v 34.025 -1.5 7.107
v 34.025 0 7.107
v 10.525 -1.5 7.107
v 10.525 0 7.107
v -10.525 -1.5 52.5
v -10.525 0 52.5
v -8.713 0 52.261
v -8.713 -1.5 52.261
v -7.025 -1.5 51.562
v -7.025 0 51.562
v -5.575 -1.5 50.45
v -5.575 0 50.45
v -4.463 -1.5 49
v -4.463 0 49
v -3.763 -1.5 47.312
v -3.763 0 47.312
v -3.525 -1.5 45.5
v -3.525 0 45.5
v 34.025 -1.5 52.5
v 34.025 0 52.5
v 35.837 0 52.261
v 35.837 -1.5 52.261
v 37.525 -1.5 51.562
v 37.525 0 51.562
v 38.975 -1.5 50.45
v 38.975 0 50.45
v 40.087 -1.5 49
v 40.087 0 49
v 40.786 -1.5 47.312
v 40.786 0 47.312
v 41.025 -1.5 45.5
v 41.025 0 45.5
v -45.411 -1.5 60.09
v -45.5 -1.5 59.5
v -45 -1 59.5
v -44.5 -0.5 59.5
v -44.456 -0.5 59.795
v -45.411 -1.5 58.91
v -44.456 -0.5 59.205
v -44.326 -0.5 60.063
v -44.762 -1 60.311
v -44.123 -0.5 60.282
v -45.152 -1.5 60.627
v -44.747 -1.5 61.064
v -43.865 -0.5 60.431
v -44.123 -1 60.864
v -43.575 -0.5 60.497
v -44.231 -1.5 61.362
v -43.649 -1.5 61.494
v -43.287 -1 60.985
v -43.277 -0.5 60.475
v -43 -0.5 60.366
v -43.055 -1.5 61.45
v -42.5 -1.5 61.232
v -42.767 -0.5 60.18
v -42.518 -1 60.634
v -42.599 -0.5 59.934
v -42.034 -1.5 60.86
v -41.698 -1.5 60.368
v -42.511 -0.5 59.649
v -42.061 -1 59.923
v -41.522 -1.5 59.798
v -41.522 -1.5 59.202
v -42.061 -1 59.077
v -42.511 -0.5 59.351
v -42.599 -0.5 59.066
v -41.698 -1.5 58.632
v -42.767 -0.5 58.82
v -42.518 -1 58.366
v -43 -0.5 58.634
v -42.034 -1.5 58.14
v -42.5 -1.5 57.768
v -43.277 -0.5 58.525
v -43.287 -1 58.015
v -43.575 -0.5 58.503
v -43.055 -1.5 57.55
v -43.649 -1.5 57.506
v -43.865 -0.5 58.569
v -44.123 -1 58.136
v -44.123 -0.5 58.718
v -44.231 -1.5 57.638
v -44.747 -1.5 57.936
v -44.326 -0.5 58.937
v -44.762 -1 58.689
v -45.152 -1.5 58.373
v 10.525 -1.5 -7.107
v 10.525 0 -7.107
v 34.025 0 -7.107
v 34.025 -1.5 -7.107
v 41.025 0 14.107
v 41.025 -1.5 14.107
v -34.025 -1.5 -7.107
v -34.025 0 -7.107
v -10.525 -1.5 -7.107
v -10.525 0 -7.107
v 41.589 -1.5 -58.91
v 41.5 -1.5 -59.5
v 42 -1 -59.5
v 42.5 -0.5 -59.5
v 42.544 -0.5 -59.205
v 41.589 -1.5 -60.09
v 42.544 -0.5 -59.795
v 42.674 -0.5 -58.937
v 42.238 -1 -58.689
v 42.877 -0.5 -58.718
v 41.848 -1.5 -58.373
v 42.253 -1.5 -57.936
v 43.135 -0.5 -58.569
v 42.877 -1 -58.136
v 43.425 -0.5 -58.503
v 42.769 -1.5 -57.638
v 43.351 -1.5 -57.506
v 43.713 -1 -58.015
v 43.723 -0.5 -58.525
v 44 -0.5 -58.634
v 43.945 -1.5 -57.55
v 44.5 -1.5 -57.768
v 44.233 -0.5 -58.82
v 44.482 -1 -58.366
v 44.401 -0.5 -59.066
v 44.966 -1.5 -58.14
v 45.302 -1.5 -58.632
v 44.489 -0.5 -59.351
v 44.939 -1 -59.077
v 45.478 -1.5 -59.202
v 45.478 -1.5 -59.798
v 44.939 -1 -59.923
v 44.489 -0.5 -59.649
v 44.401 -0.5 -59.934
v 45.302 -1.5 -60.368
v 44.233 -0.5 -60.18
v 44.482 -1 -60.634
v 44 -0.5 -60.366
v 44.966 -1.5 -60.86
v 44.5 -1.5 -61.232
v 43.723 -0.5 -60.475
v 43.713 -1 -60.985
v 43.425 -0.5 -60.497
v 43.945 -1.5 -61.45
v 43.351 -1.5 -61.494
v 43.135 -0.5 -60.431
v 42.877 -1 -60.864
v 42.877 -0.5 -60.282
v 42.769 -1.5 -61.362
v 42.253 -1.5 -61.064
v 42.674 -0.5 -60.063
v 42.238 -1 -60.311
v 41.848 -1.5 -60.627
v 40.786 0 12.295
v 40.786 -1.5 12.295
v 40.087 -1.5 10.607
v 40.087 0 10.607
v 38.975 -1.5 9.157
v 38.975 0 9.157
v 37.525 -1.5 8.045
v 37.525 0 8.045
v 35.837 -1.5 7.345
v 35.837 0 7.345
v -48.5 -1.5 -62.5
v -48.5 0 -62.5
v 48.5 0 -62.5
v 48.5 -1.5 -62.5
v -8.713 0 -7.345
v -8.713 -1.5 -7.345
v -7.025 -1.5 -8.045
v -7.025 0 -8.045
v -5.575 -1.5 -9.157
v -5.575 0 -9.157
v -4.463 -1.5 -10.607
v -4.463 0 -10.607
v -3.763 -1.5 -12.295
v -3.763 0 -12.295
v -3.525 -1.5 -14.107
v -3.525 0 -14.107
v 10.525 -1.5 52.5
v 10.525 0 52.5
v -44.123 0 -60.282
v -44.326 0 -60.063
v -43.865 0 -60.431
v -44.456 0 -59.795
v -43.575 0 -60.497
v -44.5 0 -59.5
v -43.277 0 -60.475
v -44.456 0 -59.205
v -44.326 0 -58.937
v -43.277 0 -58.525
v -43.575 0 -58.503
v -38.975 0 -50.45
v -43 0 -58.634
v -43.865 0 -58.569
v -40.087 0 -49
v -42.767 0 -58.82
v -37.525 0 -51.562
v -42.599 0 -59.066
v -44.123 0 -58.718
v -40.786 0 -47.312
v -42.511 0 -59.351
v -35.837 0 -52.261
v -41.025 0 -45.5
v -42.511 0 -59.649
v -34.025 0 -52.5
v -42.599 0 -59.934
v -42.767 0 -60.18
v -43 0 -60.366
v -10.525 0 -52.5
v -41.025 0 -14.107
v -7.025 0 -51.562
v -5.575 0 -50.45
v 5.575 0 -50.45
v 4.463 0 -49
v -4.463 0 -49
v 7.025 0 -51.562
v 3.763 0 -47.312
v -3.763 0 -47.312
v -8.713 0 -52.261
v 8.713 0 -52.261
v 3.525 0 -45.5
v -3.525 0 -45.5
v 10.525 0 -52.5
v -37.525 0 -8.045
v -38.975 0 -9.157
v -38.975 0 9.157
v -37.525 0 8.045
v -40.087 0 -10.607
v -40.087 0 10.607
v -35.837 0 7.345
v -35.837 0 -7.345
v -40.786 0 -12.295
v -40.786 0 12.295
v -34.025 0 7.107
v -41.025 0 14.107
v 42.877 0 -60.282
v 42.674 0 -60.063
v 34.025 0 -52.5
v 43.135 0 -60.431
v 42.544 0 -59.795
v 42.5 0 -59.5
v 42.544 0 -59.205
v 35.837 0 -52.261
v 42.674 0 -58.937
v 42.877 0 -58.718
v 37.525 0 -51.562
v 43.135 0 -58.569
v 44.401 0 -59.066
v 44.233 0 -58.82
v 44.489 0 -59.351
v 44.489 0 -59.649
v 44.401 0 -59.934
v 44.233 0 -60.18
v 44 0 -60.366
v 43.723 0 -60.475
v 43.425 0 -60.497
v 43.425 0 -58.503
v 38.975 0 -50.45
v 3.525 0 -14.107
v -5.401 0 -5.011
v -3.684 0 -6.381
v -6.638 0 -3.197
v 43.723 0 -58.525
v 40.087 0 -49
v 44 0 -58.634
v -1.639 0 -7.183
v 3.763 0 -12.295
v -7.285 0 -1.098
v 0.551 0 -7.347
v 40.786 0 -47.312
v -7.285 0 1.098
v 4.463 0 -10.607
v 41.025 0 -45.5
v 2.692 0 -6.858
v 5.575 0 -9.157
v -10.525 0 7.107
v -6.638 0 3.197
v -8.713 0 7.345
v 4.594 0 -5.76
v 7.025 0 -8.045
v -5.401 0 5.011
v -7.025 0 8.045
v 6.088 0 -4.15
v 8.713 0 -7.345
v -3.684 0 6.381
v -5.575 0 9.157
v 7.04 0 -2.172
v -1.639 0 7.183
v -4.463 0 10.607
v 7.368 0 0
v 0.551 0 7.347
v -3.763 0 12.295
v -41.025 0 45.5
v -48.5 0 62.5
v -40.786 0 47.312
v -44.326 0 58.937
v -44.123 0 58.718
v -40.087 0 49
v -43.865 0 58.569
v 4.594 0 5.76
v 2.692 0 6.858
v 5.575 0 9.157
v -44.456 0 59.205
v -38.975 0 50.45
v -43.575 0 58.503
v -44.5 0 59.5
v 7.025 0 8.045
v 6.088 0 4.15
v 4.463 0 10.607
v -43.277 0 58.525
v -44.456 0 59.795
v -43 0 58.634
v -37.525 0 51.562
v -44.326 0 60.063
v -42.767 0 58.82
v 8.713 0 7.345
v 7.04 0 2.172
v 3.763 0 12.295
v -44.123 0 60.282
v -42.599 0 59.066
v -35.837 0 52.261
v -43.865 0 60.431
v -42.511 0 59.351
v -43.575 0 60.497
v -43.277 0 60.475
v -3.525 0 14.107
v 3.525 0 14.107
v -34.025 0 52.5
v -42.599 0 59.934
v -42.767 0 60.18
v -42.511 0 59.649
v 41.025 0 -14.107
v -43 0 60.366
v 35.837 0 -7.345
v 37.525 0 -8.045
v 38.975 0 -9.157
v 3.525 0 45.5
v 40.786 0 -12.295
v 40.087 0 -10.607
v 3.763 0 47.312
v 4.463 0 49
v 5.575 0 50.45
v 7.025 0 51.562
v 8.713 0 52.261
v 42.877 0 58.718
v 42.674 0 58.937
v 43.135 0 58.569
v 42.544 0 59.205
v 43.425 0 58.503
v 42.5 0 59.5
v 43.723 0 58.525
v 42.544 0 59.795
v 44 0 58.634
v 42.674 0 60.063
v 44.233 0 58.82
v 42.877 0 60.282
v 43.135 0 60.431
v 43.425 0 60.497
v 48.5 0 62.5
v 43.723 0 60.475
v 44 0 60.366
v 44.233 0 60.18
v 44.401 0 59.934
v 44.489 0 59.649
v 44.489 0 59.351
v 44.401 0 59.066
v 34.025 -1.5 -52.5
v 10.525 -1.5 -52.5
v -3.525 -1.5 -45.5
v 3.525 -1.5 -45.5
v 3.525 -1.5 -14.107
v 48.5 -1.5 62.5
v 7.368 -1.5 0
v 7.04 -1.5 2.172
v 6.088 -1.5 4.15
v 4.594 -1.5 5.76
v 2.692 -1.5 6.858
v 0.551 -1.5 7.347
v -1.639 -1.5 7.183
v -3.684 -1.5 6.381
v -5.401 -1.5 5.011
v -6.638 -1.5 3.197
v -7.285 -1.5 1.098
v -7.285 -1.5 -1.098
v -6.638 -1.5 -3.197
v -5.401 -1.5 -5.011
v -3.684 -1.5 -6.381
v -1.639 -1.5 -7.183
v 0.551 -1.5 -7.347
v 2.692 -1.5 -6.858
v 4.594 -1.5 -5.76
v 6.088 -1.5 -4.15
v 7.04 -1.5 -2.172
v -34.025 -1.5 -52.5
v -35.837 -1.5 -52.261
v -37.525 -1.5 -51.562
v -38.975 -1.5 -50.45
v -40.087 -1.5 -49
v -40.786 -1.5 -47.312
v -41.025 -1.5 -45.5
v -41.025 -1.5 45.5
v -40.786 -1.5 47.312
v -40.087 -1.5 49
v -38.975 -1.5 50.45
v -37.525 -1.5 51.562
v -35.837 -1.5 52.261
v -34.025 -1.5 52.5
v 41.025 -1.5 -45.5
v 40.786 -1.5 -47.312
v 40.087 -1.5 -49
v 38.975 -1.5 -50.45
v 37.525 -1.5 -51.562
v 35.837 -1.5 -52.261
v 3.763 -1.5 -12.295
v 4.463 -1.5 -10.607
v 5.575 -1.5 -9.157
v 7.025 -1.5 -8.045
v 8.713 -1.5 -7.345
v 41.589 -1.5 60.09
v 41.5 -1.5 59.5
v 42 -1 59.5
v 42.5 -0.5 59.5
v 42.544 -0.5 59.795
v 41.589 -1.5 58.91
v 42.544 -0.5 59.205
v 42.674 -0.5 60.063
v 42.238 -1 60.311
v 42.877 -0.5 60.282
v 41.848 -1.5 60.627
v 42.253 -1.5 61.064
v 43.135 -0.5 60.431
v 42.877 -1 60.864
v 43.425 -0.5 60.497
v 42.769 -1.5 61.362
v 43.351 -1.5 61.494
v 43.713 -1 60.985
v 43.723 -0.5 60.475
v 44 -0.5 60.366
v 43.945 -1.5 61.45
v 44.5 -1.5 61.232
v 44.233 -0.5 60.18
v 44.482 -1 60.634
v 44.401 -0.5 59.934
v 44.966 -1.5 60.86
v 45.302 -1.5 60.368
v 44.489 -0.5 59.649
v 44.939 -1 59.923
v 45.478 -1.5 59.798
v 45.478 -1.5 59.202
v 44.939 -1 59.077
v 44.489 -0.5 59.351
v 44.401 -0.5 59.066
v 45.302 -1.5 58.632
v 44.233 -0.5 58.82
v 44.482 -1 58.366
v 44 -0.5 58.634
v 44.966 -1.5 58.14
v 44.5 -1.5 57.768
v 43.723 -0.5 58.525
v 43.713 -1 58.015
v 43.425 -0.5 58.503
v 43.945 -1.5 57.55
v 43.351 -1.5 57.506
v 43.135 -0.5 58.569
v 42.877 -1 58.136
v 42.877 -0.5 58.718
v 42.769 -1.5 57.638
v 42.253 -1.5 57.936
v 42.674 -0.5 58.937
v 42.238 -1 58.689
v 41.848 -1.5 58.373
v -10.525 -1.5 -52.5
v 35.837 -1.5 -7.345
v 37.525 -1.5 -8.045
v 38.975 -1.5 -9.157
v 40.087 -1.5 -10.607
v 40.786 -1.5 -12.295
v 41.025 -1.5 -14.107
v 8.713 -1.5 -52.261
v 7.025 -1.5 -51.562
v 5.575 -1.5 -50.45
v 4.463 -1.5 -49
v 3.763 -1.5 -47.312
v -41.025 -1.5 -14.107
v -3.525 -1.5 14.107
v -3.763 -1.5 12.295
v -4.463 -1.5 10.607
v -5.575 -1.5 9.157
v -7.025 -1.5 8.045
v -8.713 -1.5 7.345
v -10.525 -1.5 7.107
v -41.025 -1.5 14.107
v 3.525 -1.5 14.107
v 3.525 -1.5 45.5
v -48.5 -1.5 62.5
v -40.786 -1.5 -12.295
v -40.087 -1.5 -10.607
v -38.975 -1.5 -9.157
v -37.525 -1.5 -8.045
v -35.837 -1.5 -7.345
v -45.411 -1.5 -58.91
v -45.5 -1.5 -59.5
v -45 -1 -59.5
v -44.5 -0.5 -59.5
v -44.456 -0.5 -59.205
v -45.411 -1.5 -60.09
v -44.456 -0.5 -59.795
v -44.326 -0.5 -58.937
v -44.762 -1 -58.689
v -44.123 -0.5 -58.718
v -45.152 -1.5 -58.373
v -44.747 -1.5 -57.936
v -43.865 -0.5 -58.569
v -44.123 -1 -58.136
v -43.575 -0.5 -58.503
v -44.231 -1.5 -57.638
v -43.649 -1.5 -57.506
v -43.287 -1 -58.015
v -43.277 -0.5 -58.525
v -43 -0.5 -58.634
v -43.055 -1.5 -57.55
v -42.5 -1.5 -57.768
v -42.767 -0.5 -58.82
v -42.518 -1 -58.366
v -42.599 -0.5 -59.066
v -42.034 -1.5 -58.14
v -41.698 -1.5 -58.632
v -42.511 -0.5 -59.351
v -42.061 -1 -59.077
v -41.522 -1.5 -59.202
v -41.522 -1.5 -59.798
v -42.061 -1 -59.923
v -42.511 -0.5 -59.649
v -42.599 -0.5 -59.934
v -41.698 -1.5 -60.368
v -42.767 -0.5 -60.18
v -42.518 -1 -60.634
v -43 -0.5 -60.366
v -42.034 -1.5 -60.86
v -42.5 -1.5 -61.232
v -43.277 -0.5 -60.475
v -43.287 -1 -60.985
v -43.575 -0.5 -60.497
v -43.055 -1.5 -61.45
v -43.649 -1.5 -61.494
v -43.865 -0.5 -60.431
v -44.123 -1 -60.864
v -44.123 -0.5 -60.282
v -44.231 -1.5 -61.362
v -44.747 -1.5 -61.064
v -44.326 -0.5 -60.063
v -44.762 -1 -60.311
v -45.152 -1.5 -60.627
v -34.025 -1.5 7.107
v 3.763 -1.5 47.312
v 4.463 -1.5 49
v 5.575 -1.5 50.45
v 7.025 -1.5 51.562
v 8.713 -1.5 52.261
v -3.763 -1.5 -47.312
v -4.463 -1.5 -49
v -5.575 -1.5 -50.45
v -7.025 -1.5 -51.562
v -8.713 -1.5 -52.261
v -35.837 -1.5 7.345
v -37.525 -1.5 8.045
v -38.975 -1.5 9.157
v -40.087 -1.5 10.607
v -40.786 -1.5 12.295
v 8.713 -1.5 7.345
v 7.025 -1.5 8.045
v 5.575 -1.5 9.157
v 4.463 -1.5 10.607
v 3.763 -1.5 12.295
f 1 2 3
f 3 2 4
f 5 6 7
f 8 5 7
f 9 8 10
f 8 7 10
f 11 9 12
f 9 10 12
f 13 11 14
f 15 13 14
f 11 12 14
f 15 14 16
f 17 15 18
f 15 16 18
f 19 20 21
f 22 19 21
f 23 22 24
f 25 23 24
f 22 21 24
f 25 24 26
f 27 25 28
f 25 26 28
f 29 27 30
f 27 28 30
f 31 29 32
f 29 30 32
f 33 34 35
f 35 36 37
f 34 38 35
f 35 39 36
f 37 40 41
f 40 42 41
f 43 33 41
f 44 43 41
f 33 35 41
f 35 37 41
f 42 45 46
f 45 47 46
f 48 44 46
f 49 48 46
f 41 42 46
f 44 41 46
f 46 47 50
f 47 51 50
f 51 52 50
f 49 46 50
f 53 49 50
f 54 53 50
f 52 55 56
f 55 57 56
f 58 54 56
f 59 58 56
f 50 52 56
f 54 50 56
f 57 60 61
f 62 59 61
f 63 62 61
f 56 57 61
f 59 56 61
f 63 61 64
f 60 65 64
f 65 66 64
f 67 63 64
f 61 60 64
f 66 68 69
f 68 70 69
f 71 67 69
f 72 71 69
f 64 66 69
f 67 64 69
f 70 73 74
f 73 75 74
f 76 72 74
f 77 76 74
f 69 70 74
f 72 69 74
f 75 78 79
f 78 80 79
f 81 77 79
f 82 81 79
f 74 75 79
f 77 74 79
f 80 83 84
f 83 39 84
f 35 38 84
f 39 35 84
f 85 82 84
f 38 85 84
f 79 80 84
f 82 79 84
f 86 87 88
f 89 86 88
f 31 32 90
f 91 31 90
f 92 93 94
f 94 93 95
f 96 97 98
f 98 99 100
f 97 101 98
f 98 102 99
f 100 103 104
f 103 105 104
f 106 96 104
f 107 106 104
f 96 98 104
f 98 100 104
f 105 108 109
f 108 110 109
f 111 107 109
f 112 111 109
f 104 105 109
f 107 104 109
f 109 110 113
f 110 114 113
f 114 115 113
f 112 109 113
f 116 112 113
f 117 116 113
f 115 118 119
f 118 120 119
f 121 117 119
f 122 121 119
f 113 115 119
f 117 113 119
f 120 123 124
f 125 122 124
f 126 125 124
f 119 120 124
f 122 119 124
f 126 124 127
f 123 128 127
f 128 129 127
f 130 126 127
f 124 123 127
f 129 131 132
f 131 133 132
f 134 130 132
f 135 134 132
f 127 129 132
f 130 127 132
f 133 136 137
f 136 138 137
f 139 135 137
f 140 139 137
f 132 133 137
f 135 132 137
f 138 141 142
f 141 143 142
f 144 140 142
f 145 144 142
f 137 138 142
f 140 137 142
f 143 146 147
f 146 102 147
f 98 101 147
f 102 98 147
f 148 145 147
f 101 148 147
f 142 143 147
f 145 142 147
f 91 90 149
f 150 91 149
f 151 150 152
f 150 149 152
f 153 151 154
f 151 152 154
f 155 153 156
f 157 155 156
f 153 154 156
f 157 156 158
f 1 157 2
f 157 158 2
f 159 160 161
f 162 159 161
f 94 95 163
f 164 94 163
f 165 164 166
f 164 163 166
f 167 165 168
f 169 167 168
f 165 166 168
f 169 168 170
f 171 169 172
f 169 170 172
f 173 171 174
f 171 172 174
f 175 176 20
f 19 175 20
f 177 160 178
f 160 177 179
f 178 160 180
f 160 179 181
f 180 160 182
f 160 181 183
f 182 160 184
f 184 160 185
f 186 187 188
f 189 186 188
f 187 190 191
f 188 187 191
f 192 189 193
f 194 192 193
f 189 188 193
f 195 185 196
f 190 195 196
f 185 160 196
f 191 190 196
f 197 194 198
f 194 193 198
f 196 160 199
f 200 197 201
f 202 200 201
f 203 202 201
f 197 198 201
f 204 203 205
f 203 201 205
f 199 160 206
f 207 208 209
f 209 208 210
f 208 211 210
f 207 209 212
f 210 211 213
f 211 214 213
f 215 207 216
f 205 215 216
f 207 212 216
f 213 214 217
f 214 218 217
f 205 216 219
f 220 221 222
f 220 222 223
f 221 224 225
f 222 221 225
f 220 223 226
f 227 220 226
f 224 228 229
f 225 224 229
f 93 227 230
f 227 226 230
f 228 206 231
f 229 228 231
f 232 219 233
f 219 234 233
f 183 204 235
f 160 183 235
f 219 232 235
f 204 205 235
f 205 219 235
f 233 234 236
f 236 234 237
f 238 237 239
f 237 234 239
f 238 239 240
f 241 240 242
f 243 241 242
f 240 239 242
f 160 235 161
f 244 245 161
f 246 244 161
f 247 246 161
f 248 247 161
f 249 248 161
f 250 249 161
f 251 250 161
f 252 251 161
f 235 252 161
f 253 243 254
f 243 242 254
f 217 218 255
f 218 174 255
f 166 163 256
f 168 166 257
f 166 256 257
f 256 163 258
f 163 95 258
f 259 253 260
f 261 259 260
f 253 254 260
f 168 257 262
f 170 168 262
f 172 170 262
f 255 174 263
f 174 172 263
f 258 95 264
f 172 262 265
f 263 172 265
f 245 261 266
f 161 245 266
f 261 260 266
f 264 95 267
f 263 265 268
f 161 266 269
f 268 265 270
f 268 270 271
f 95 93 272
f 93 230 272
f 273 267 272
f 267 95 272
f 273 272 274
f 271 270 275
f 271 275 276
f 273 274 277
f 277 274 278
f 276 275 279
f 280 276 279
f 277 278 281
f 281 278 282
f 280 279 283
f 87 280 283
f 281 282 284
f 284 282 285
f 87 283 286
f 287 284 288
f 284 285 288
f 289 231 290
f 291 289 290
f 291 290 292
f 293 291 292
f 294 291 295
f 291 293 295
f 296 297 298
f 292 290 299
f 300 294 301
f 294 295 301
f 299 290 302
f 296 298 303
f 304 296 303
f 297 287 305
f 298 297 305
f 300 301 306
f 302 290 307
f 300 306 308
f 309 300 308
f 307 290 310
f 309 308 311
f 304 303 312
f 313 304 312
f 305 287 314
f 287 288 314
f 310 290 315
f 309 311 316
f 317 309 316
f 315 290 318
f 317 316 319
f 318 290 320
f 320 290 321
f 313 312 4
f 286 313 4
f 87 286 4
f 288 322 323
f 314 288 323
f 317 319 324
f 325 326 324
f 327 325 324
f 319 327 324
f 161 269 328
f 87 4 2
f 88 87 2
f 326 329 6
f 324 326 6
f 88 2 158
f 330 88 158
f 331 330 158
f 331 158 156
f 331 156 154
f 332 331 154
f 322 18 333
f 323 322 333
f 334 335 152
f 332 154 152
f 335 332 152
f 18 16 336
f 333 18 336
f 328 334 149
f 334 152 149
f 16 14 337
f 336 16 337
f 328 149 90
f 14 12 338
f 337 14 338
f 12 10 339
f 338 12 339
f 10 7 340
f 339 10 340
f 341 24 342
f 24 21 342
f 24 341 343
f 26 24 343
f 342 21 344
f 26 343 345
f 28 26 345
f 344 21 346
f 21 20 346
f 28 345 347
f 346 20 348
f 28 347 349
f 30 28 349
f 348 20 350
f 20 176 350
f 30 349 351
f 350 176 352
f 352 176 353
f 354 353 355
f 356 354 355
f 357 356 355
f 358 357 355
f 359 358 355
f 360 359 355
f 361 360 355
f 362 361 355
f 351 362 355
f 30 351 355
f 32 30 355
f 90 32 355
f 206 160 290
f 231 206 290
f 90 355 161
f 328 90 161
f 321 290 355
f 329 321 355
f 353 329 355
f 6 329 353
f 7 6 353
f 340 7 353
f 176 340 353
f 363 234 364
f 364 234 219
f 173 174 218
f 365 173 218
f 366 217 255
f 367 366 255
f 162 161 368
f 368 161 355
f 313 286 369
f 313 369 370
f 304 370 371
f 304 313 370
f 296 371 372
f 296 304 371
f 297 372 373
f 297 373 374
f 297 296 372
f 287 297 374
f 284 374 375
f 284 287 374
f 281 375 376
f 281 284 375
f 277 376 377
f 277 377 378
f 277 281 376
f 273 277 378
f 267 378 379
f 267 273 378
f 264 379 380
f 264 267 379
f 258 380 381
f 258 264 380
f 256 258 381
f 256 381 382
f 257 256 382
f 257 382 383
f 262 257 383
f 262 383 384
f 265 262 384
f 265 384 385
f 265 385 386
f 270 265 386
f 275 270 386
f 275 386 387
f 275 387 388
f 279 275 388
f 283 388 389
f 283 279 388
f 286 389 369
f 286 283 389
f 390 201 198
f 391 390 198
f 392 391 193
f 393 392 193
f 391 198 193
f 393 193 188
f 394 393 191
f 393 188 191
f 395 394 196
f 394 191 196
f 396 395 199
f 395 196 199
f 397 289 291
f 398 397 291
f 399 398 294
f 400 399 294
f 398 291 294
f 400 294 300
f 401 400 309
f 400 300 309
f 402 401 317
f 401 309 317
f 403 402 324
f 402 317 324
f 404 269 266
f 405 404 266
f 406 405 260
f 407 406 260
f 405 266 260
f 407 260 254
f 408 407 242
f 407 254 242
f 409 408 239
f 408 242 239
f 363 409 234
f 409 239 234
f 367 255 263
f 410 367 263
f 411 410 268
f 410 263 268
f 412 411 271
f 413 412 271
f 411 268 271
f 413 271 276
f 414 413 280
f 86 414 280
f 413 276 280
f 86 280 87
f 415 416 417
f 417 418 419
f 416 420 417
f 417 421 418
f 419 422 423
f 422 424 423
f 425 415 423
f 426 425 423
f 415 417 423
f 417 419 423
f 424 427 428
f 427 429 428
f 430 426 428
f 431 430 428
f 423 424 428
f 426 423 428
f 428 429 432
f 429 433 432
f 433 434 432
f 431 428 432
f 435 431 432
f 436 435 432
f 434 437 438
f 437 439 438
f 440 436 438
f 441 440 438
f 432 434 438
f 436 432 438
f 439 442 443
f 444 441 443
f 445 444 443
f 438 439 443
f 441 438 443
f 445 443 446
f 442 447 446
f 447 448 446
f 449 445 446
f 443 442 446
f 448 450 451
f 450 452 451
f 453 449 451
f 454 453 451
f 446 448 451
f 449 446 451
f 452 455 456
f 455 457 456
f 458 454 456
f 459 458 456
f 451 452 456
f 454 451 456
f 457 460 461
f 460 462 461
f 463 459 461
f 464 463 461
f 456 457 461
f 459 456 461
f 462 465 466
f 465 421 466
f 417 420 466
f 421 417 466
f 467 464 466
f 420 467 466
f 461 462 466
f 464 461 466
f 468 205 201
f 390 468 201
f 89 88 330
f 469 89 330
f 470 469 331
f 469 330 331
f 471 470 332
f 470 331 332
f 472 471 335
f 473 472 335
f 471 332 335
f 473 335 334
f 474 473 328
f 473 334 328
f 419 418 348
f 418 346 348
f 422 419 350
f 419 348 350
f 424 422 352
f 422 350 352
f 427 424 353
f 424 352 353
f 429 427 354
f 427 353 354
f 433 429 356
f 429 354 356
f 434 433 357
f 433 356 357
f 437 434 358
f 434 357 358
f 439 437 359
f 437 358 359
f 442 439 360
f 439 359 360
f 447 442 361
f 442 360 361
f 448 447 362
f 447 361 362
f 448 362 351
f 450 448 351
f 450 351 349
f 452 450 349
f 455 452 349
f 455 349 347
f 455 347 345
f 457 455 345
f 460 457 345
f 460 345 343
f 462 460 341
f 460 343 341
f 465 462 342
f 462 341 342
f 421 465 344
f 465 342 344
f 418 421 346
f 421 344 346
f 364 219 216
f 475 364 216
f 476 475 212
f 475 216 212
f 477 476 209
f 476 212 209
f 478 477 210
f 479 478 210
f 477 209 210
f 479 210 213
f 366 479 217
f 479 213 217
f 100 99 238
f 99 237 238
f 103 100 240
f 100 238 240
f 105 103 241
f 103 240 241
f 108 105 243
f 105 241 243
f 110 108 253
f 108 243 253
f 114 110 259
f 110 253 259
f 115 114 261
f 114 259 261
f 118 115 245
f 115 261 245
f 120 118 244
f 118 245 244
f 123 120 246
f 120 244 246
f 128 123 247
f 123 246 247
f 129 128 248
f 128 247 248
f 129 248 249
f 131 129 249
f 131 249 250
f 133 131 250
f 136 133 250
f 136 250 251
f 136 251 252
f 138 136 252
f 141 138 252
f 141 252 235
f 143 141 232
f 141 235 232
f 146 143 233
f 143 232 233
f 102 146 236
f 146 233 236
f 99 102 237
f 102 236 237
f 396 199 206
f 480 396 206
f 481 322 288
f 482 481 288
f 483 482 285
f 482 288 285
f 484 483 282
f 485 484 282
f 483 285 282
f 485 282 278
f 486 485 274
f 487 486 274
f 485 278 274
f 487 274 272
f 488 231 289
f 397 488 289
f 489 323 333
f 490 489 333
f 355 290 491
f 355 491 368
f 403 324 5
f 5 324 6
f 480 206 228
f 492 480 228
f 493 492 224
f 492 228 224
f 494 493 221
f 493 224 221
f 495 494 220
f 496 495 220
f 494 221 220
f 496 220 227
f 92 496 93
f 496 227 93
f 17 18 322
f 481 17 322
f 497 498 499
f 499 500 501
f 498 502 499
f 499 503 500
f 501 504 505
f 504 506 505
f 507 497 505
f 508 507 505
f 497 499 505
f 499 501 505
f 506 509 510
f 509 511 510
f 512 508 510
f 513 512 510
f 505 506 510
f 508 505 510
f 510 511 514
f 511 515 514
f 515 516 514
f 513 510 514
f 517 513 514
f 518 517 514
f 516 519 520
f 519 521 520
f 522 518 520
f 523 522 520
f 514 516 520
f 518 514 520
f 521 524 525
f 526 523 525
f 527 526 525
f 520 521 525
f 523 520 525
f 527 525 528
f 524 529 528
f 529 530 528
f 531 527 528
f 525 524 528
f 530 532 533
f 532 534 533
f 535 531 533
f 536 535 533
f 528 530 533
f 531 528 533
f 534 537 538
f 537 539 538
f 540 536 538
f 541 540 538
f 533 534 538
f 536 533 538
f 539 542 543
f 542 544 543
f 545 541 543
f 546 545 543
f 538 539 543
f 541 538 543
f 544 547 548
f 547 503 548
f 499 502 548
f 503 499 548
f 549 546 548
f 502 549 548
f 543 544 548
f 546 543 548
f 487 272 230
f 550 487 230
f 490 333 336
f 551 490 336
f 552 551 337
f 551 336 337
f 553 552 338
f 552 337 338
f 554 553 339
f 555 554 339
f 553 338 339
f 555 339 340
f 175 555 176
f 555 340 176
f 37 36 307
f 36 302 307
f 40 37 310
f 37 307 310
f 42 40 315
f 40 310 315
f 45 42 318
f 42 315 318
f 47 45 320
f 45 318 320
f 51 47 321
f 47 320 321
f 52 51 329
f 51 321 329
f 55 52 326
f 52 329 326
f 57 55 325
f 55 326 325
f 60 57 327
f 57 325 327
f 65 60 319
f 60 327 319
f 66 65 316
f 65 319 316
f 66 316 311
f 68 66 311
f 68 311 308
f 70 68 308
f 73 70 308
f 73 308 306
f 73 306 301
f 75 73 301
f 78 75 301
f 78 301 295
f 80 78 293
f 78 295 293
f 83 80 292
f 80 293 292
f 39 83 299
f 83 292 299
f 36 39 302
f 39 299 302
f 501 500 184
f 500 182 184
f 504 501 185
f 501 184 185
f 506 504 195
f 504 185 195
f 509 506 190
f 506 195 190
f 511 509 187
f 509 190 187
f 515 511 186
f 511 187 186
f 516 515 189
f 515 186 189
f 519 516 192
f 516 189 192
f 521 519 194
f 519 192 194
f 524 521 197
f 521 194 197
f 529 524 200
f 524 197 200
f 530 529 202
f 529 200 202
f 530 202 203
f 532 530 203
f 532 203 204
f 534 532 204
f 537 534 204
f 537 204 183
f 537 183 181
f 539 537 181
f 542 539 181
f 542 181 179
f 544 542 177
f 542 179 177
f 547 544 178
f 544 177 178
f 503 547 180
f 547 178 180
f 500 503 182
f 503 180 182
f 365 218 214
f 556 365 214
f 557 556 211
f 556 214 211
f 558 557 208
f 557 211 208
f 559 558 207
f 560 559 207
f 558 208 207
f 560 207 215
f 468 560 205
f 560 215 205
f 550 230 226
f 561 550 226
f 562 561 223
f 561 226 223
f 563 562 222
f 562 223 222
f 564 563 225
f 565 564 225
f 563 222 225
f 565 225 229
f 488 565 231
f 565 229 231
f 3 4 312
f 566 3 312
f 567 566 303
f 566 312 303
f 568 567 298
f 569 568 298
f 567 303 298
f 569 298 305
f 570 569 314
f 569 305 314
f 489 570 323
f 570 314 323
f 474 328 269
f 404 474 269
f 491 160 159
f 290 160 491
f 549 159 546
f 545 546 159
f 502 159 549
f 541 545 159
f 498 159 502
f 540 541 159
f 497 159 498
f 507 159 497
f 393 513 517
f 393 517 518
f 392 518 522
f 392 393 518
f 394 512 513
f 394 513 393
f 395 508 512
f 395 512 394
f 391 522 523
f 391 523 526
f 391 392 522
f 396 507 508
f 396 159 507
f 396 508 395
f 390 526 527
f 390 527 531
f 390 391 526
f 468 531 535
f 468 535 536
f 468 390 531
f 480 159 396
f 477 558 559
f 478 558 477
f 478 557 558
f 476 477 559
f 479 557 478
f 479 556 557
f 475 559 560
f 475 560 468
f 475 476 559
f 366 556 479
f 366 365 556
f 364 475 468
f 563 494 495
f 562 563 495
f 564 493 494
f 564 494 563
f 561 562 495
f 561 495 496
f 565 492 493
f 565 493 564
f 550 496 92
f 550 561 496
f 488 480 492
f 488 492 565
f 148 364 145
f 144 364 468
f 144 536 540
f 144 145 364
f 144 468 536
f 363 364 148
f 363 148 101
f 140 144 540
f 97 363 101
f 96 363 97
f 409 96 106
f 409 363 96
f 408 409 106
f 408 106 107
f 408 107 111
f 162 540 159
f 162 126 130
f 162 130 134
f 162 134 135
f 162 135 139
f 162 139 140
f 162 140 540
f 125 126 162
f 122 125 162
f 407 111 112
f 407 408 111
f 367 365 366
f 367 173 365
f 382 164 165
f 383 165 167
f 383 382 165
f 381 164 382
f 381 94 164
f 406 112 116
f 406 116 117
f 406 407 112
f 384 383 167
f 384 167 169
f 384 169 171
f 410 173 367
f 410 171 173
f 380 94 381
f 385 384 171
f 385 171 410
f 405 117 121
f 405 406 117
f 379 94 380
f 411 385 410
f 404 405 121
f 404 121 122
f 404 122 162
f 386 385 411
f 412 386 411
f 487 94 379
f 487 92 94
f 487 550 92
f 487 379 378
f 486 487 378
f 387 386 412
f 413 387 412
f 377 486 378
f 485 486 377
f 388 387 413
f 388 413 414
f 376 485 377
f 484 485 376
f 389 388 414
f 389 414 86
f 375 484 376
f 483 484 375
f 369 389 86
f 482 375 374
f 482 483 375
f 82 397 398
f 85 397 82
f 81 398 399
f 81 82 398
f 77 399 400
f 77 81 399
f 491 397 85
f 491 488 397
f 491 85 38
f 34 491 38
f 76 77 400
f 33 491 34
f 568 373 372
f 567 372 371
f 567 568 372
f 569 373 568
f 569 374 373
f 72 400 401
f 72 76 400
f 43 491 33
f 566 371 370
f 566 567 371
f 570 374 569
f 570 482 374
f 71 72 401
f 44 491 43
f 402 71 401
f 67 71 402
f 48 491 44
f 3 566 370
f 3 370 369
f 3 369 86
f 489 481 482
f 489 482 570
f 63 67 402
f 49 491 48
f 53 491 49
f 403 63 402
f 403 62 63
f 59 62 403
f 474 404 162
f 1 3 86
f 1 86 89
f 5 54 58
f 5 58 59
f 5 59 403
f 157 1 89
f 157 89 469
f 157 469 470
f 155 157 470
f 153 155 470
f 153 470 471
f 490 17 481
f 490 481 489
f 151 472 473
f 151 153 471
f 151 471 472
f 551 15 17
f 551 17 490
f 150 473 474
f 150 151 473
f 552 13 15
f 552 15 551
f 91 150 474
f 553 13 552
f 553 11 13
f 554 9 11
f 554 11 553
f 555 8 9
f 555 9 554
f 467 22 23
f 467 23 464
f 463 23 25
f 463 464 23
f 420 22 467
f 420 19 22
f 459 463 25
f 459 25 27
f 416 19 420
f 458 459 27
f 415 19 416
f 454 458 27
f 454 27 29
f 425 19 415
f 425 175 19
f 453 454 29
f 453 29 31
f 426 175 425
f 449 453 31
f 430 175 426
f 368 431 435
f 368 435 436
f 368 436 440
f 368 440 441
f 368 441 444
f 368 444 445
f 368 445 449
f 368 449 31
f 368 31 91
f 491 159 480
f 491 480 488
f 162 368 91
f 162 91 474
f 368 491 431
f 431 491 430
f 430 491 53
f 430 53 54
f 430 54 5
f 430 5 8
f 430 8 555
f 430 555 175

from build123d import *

# Parameters (mm, degrees)
F0_W           = 97
F0_H           = 125
F0_R           = 7.367785
F1_DEPTH       = 1.5
F3_D           = 2
F3_CSINK_D     = 4
F3_CSINK_ANGLE = 90


# Not quite as in the source:
# - a feature names something its author has since deleted; it is built from what else it names


with BuildPart() as f1:
    # F0 (on Front) → F1 (new body)
    with BuildSketch(Plane.XZ):
        Rectangle(F0_W, F0_H)
        with BuildLine():
            Line((-34.0249225795, -7.10684), (-10.5249225795, -7.10684))
            ThreePointArc((-10.5249225795, -7.10684), (-5.5751751112, -9.1570925317), (-3.5249225795, -14.10684))
            Line((-3.5249225795, -14.10684), (-3.5249225795, -45.5))
            ThreePointArc((-3.5249225795, -45.5), (-5.5751751112, -50.4497474683), (-10.5249225795, -52.5))
            Line((-10.5249225795, -52.5), (-34.0249225795, -52.5))
            ThreePointArc((-34.0249225795, -52.5), (-38.9746700478, -50.4497474683), (-41.0249225795, -45.5))
            Line((-41.0249225795, -45.5), (-41.0249225795, -14.10684))
            ThreePointArc((-41.0249225795, -14.10684), (-38.9746700478, -9.1570925317), (-34.0249225795, -7.10684))
        make_face(mode=Mode.SUBTRACT)
        with BuildLine():
            ThreePointArc((41.0249225795, -45.5), (38.9746700478, -50.4497474683), (34.0249225795, -52.5))
            Line((34.0249225795, -52.5), (10.5249225795, -52.5))
            ThreePointArc((10.5249225795, -52.5), (5.5751751112, -50.4497474683), (3.5249225795, -45.5))
            Line((3.5249225795, -45.5), (3.5249225795, -14.10684))
            ThreePointArc((3.5249225795, -14.10684), (5.5751751112, -9.1570925317), (10.5249225795, -7.10684))
            Line((10.5249225795, -7.10684), (34.0249225795, -7.10684))
            ThreePointArc((34.0249225795, -7.10684), (38.9746700478, -9.1570925317), (41.0249225795, -14.10684))
            Line((41.0249225795, -14.10684), (41.0249225795, -45.5))
        make_face(mode=Mode.SUBTRACT)
        with BuildLine():
            ThreePointArc((-3.5249225795, 14.10684), (-5.5751751112, 9.1570925317), (-10.5249225795, 7.10684))
            Line((-10.5249225795, 7.10684), (-34.0249225795, 7.10684))
            ThreePointArc((-34.0249225795, 7.10684), (-38.9746700478, 9.1570925317), (-41.0249225795, 14.10684))
            Line((-41.0249225795, 14.10684), (-41.0249225795, 45.5))
            ThreePointArc((-41.0249225795, 45.5), (-38.9746700478, 50.4497474683), (-34.0249225795, 52.5))
            Line((-34.0249225795, 52.5), (-10.5249225795, 52.5))
            ThreePointArc((-10.5249225795, 52.5), (-5.5751751112, 50.4497474683), (-3.5249225795, 45.5))
            Line((-3.5249225795, 45.5), (-3.5249225795, 14.10684))
        make_face(mode=Mode.SUBTRACT)
        Circle(F0_R, mode=Mode.SUBTRACT)
        with BuildLine():
            ThreePointArc((10.5249225795, 7.10684), (5.5751751112, 9.1570925317), (3.5249225795, 14.10684))
            Line((3.5249225795, 14.10684), (3.5249225795, 45.5))
            ThreePointArc((3.5249225795, 45.5), (5.5751751112, 50.4497474683), (10.5249225795, 52.5))
            Line((10.5249225795, 52.5), (34.0249225795, 52.5))
            ThreePointArc((34.0249225795, 52.5), (38.9746700478, 50.4497474683), (41.0249225795, 45.5))
            Line((41.0249225795, 45.5), (41.0249225795, 14.10684))
            ThreePointArc((41.0249225795, 14.10684), (38.9746700478, 9.1570925317), (34.0249225795, 7.10684))
            Line((34.0249225795, 7.10684), (10.5249225795, 7.10684))
        make_face(mode=Mode.SUBTRACT)
    extrude(amount=F1_DEPTH)

    # F3 (through all)
    with Locations(Plane.XZ.offset(1.5)):
        with Locations((-43.5, -59.5), (43.5, -59.5), (43.5, 59.5), (-43.5, 59.5)):
            CounterSinkHole(F3_D / 2, F3_CSINK_D / 2, counter_sink_angle=F3_CSINK_ANGLE)


solid = f1.part
